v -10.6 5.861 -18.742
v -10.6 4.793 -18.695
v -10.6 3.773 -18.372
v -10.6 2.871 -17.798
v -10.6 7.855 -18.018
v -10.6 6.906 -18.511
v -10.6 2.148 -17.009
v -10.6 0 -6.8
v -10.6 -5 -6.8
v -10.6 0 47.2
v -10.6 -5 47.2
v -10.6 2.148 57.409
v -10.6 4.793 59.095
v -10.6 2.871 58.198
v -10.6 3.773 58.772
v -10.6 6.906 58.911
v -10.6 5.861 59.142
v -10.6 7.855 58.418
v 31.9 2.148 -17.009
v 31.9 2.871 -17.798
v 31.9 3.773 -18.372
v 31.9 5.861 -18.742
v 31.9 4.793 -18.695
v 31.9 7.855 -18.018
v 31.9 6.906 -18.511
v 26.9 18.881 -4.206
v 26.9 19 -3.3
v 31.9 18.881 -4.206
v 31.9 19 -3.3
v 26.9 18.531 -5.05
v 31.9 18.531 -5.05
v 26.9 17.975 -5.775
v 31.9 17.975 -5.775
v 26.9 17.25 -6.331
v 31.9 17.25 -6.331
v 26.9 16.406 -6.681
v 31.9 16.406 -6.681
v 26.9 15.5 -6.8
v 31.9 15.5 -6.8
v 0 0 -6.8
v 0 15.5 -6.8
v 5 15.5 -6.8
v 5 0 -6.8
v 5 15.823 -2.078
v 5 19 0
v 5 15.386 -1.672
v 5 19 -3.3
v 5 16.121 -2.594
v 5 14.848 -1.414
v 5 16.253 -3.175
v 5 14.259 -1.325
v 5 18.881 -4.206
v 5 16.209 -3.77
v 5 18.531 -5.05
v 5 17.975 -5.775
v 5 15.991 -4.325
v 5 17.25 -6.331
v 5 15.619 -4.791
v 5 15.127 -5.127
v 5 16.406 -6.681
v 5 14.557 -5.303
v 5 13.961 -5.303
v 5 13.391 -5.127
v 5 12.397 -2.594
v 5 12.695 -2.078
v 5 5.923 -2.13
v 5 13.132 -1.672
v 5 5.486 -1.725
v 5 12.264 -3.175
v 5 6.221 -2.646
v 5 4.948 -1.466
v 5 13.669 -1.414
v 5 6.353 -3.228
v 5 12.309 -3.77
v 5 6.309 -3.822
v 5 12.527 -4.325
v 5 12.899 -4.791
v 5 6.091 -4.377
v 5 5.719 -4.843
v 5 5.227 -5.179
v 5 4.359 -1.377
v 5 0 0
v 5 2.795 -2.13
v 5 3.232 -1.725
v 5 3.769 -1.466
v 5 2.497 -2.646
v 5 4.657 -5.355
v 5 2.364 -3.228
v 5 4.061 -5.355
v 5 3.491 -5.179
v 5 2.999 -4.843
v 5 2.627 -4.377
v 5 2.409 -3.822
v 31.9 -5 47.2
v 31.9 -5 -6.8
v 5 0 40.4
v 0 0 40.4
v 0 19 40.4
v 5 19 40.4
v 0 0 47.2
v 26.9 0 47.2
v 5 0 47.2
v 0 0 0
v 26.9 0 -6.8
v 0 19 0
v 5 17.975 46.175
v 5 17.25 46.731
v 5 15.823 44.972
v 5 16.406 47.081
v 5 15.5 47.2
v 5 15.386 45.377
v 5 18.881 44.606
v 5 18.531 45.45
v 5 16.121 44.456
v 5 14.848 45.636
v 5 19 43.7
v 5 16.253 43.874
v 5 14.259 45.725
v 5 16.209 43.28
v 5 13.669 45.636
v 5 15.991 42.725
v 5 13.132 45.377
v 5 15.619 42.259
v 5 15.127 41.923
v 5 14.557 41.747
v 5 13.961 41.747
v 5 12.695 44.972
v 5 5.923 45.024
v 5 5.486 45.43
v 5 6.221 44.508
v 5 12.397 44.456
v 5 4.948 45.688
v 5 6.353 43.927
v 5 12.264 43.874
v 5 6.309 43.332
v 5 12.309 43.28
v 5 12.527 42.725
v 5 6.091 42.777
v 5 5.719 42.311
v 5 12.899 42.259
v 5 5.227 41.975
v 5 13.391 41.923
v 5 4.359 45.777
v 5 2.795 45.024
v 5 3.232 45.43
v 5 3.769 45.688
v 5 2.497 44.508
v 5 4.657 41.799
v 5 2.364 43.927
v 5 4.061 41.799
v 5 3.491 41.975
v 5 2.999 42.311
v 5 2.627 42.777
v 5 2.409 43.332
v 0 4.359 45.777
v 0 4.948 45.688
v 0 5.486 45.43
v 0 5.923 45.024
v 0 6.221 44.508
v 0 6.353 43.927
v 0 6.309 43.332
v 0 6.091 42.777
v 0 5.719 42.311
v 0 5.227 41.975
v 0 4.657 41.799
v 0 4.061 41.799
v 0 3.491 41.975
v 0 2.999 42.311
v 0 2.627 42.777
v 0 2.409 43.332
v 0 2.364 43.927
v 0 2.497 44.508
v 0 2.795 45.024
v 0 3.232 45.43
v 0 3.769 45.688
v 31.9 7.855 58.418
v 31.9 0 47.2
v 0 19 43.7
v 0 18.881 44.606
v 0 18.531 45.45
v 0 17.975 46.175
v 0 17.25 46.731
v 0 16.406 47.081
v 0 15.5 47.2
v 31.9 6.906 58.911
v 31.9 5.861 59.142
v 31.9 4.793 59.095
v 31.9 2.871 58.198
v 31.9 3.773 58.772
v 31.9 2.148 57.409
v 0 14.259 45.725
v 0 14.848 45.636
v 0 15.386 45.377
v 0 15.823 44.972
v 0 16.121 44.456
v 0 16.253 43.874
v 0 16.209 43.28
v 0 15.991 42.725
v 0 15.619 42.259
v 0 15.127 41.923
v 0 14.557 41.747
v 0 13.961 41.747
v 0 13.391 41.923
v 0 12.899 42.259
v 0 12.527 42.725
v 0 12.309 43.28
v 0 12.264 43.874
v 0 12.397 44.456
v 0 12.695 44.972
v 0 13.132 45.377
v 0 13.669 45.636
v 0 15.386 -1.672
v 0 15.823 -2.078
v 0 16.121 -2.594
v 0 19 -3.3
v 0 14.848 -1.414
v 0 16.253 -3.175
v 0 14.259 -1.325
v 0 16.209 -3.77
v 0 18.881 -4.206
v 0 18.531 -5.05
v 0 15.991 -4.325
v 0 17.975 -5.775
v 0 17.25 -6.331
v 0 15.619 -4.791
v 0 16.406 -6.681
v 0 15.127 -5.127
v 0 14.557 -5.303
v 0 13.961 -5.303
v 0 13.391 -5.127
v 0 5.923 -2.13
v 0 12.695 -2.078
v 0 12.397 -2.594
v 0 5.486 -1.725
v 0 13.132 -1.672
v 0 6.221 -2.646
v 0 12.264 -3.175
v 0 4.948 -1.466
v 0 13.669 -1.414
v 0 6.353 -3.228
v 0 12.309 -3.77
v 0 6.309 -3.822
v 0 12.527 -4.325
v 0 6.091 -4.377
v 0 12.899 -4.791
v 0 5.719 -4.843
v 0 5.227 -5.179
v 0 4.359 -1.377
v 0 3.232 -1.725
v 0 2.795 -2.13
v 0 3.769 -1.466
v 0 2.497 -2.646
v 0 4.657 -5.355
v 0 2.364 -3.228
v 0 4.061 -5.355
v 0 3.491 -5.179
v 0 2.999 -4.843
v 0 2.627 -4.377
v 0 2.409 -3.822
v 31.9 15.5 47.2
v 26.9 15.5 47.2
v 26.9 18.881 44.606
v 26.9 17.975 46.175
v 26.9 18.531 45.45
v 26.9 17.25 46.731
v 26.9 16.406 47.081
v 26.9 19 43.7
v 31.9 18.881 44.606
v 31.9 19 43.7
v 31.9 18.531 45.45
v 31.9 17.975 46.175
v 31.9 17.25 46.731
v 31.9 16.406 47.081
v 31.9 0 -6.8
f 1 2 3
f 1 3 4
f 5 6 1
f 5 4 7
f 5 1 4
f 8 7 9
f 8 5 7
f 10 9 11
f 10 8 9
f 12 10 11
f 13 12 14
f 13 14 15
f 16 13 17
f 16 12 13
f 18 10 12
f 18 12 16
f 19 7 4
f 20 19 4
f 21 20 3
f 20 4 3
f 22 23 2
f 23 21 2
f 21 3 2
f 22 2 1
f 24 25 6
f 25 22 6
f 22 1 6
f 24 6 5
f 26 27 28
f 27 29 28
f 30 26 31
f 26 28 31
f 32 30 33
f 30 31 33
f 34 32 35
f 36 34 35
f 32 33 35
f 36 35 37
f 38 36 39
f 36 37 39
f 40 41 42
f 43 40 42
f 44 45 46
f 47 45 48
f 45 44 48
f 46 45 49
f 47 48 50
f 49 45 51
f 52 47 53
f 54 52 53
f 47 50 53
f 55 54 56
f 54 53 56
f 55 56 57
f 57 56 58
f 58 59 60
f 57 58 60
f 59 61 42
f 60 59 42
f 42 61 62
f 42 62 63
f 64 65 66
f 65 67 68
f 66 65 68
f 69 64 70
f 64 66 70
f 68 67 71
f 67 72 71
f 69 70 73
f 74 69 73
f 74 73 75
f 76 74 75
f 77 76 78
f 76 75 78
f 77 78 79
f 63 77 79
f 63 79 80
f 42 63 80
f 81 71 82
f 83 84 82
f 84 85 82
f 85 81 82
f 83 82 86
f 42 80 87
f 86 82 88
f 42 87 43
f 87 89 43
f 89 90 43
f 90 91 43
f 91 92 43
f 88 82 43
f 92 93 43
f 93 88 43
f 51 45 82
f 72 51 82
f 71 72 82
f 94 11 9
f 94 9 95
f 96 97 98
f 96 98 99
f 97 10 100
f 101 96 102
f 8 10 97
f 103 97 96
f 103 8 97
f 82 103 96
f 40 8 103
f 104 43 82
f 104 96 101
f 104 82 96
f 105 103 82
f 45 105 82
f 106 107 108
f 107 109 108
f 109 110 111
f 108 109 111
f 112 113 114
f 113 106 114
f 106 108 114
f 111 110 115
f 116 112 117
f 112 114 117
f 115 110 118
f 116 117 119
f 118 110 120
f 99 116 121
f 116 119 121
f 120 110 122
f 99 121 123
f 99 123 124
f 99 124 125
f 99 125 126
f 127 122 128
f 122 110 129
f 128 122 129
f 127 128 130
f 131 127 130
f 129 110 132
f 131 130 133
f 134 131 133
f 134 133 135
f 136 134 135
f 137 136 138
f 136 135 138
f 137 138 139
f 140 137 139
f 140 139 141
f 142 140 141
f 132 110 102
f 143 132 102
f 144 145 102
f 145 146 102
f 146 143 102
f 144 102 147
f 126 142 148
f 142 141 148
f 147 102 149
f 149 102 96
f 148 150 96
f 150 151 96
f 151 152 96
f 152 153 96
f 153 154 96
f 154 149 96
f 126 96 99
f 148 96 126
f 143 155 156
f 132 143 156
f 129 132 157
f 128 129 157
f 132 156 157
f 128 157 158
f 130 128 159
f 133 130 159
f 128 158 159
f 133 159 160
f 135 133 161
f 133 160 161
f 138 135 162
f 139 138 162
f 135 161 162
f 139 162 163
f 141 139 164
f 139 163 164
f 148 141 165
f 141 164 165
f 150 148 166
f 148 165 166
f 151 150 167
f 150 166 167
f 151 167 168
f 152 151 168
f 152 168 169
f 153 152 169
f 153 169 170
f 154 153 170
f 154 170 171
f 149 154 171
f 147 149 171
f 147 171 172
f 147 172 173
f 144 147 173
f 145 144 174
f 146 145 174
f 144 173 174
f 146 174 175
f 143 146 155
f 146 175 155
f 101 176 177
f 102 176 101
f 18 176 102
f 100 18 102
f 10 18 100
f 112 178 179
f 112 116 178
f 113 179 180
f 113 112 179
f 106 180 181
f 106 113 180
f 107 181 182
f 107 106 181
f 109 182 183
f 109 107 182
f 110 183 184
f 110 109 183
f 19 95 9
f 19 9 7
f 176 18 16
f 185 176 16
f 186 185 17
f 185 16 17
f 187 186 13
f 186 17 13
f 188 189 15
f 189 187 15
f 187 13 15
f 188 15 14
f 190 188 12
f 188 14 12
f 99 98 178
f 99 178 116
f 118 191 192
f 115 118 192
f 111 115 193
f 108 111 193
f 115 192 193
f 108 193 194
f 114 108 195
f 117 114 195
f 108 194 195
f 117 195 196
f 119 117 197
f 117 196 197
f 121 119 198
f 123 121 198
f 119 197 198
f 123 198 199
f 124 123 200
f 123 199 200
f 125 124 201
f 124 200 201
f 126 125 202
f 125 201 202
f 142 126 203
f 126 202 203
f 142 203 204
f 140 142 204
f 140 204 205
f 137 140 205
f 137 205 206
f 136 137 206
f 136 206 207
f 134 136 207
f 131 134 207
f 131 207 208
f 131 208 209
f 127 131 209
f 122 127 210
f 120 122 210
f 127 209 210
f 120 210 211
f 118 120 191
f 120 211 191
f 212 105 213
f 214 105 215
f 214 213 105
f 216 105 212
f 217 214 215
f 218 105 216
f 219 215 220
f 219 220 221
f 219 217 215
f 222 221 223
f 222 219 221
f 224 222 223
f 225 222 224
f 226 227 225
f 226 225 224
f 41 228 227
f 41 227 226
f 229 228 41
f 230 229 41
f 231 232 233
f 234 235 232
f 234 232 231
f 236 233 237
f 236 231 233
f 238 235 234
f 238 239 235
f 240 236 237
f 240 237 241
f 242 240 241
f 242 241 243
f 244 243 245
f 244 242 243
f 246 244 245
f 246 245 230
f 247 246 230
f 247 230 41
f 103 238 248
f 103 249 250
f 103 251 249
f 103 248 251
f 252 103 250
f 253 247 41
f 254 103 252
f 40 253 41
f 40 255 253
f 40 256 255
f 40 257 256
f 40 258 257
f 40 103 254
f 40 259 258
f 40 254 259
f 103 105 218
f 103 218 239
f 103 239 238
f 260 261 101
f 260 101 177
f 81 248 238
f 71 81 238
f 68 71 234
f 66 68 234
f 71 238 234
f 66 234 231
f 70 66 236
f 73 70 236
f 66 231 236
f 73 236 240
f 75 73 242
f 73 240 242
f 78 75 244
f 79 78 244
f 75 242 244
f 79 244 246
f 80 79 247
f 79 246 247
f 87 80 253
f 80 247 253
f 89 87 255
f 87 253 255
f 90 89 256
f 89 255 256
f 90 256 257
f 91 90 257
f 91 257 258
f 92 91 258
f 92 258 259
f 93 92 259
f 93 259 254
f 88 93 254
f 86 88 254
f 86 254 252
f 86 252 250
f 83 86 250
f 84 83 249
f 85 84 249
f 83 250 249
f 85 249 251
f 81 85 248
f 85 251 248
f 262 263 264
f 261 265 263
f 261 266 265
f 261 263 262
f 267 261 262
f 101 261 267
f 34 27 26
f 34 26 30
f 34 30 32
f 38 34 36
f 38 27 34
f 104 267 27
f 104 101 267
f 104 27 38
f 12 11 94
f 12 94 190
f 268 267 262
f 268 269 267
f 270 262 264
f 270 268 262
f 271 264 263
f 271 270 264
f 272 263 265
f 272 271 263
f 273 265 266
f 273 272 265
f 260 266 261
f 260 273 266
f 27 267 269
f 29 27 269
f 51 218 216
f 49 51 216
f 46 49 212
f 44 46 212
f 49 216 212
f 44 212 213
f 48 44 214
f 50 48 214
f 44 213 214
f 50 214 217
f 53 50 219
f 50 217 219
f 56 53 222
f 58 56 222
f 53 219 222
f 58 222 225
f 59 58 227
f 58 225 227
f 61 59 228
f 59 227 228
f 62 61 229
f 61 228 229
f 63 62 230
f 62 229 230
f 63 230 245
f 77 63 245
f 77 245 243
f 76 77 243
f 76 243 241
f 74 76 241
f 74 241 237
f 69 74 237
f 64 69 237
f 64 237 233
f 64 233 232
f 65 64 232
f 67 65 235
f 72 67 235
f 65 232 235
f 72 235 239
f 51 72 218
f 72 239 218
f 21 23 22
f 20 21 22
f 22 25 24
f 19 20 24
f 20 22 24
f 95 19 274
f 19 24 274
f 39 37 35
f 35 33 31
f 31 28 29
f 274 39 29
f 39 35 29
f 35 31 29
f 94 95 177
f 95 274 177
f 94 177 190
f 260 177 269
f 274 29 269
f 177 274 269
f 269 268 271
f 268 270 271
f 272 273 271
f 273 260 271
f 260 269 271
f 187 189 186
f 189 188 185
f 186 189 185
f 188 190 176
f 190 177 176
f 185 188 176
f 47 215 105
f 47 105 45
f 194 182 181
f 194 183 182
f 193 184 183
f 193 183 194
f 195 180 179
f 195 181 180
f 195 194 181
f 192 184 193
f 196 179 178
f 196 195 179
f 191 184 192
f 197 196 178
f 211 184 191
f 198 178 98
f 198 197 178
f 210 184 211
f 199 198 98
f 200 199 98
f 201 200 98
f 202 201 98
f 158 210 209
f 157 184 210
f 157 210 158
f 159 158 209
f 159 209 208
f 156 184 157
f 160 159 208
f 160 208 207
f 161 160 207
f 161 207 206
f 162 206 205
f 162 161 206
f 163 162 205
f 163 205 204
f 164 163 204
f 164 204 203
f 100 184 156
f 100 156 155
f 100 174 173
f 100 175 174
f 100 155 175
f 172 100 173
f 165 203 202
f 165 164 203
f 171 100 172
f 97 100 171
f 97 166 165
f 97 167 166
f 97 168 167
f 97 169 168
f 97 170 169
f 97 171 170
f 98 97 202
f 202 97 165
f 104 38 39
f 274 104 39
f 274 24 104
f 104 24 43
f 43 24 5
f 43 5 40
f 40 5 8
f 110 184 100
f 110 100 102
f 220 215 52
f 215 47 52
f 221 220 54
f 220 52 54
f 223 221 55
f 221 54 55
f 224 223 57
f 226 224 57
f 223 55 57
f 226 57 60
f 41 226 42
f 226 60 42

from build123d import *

# Parameters (mm, degrees)
SKETCH_OF_SERVO_MOTOR_W             = 42.5
SKETCH_OF_SERVO_MOTOR_H             = 54
EXTRUDE_BASE_OF_FOOT_DEPTH          = 5
POSITIONS_OF_FOOT_SIDES_W           = 5
POSITIONS_OF_FOOT_SIDES_H           = 54
POSITIONS_OF_FOOT_SIDES_H_2         = 6.8
EXTRUDE_SIDES_OF_FOOT_DEPTH         = 19
FILLET_TOP_EDGES_OF_SIDES_OF_FOOT_R = 3.5
EXTRUDE_FOOT_LIPS_DEPTH             = 42.5
FILLET_FOOT_LIPS_R                  = 4.1
HOLE_DIMENSIONS_FOR_M4_BOLT_R       = 2
EXTRUDE_CUT_HOLE_FOR_M4_BOLT_DEPTH  = 5


with BuildPart() as part:
    # Sketch of Servo Motor → Extrude Base of Foot (new body)
    with BuildSketch(Plane(origin=(0, 0, 0), x_dir=(1, 0, 0), z_dir=(0, 1, 0))):
        with Locations((10.65, -20.2)):
            Rectangle(SKETCH_OF_SERVO_MOTOR_W, SKETCH_OF_SERVO_MOTOR_H)
    extrude(amount=-EXTRUDE_BASE_OF_FOOT_DEPTH)

    # Positions of Foot Sides → Extrude Sides of Foot (add)
    with BuildSketch(Plane(origin=(0, 0, 0), x_dir=(1, 0, 0), z_dir=(0, 1, 0))):
        with Locations((29.4, -20.2)):
            Rectangle(POSITIONS_OF_FOOT_SIDES_W, POSITIONS_OF_FOOT_SIDES_H)
        with Locations((2.5, 3.4)):
            Rectangle(POSITIONS_OF_FOOT_SIDES_W, POSITIONS_OF_FOOT_SIDES_H_2)
        with Locations((2.5, -43.8)):
            Rectangle(POSITIONS_OF_FOOT_SIDES_W, POSITIONS_OF_FOOT_SIDES_H_2)
    extrude(amount=EXTRUDE_SIDES_OF_FOOT_DEPTH)

    # Fillet Top Edges of Sides of Foot
    fillet_top_edges_of_sides_of_foot_edges = [part.edges().sort_by_distance(p)[0] for p in [
        (2.5, 19, -6.8),
        (2.5, 19, 47.2),
        (29.4, 19, -6.8),
        (29.4, 19, 47.2),
    ]]
    fillet(fillet_top_edges_of_sides_of_foot_edges, radius=FILLET_TOP_EDGES_OF_SIDES_OF_FOOT_R)

    # Front and Back Foot Lips → Extrude Foot Lips (add, through all)
    with BuildSketch(Plane.ZY.offset(10.6)):
        Polygon((60.767406064, 4.5), (58.418174512, 7.855050358), (47.2, 0), (47.2, -5), align=None)
        Polygon((-6.8, 0), (-6.8, -5), (-20.367406064, 4.5), (-18.018174512, 7.855050358), align=None)
    extrude(amount=-EXTRUDE_FOOT_LIPS_DEPTH)

    # Fillet Foot Lips
    # the kernel refuses this fillet: 4.1 mm, written as the material it takes off along each edge
    with BuildSketch(Plane(origin=(-20.85, 4.5, 60.767406064), x_dir=(0, 0.8191520442889908, -0.5735764363510476), z_dir=(1, 0, 0)), Plane(origin=(-20.85, 4.5, -20.367406064), x_dir=(0, -0.5735764363510438, 0.8191520442889934), z_dir=(1, 0, 0))) as fillet_foot_lips_piece_1:
        with BuildLine():
            CenterArc((FILLET_FOOT_LIPS_R, -FILLET_FOOT_LIPS_R), FILLET_FOOT_LIPS_R, 90, 90)
            Line((0, -FILLET_FOOT_LIPS_R), (0, 0))
            Line((0, 0), (FILLET_FOOT_LIPS_R, 0))
        make_face()
    extrude(amount=63, mode=Mode.SUBTRACT)

    # Hole Dimensions for M4 Bolt → Extrude Cut Hole for M4 Bolt (cut)
    with BuildSketch(Plane.ZY):
        with Locations((-3.324953132, 14.258904835)):
            Circle(HOLE_DIMENSIONS_FOR_M4_BOLT_R)
        with Locations((-3.377058396, 4.358904835)):
            Circle(HOLE_DIMENSIONS_FOR_M4_BOLT_R)
        with Locations((43.724953132, 14.258904835)):
            Circle(HOLE_DIMENSIONS_FOR_M4_BOLT_R)
        with Locations((43.777058396, 4.358904835)):
            Circle(HOLE_DIMENSIONS_FOR_M4_BOLT_R)
    extrude(amount=-EXTRUDE_CUT_HOLE_FOR_M4_BOLT_DEPTH, mode=Mode.SUBTRACT)


solid = part.part
